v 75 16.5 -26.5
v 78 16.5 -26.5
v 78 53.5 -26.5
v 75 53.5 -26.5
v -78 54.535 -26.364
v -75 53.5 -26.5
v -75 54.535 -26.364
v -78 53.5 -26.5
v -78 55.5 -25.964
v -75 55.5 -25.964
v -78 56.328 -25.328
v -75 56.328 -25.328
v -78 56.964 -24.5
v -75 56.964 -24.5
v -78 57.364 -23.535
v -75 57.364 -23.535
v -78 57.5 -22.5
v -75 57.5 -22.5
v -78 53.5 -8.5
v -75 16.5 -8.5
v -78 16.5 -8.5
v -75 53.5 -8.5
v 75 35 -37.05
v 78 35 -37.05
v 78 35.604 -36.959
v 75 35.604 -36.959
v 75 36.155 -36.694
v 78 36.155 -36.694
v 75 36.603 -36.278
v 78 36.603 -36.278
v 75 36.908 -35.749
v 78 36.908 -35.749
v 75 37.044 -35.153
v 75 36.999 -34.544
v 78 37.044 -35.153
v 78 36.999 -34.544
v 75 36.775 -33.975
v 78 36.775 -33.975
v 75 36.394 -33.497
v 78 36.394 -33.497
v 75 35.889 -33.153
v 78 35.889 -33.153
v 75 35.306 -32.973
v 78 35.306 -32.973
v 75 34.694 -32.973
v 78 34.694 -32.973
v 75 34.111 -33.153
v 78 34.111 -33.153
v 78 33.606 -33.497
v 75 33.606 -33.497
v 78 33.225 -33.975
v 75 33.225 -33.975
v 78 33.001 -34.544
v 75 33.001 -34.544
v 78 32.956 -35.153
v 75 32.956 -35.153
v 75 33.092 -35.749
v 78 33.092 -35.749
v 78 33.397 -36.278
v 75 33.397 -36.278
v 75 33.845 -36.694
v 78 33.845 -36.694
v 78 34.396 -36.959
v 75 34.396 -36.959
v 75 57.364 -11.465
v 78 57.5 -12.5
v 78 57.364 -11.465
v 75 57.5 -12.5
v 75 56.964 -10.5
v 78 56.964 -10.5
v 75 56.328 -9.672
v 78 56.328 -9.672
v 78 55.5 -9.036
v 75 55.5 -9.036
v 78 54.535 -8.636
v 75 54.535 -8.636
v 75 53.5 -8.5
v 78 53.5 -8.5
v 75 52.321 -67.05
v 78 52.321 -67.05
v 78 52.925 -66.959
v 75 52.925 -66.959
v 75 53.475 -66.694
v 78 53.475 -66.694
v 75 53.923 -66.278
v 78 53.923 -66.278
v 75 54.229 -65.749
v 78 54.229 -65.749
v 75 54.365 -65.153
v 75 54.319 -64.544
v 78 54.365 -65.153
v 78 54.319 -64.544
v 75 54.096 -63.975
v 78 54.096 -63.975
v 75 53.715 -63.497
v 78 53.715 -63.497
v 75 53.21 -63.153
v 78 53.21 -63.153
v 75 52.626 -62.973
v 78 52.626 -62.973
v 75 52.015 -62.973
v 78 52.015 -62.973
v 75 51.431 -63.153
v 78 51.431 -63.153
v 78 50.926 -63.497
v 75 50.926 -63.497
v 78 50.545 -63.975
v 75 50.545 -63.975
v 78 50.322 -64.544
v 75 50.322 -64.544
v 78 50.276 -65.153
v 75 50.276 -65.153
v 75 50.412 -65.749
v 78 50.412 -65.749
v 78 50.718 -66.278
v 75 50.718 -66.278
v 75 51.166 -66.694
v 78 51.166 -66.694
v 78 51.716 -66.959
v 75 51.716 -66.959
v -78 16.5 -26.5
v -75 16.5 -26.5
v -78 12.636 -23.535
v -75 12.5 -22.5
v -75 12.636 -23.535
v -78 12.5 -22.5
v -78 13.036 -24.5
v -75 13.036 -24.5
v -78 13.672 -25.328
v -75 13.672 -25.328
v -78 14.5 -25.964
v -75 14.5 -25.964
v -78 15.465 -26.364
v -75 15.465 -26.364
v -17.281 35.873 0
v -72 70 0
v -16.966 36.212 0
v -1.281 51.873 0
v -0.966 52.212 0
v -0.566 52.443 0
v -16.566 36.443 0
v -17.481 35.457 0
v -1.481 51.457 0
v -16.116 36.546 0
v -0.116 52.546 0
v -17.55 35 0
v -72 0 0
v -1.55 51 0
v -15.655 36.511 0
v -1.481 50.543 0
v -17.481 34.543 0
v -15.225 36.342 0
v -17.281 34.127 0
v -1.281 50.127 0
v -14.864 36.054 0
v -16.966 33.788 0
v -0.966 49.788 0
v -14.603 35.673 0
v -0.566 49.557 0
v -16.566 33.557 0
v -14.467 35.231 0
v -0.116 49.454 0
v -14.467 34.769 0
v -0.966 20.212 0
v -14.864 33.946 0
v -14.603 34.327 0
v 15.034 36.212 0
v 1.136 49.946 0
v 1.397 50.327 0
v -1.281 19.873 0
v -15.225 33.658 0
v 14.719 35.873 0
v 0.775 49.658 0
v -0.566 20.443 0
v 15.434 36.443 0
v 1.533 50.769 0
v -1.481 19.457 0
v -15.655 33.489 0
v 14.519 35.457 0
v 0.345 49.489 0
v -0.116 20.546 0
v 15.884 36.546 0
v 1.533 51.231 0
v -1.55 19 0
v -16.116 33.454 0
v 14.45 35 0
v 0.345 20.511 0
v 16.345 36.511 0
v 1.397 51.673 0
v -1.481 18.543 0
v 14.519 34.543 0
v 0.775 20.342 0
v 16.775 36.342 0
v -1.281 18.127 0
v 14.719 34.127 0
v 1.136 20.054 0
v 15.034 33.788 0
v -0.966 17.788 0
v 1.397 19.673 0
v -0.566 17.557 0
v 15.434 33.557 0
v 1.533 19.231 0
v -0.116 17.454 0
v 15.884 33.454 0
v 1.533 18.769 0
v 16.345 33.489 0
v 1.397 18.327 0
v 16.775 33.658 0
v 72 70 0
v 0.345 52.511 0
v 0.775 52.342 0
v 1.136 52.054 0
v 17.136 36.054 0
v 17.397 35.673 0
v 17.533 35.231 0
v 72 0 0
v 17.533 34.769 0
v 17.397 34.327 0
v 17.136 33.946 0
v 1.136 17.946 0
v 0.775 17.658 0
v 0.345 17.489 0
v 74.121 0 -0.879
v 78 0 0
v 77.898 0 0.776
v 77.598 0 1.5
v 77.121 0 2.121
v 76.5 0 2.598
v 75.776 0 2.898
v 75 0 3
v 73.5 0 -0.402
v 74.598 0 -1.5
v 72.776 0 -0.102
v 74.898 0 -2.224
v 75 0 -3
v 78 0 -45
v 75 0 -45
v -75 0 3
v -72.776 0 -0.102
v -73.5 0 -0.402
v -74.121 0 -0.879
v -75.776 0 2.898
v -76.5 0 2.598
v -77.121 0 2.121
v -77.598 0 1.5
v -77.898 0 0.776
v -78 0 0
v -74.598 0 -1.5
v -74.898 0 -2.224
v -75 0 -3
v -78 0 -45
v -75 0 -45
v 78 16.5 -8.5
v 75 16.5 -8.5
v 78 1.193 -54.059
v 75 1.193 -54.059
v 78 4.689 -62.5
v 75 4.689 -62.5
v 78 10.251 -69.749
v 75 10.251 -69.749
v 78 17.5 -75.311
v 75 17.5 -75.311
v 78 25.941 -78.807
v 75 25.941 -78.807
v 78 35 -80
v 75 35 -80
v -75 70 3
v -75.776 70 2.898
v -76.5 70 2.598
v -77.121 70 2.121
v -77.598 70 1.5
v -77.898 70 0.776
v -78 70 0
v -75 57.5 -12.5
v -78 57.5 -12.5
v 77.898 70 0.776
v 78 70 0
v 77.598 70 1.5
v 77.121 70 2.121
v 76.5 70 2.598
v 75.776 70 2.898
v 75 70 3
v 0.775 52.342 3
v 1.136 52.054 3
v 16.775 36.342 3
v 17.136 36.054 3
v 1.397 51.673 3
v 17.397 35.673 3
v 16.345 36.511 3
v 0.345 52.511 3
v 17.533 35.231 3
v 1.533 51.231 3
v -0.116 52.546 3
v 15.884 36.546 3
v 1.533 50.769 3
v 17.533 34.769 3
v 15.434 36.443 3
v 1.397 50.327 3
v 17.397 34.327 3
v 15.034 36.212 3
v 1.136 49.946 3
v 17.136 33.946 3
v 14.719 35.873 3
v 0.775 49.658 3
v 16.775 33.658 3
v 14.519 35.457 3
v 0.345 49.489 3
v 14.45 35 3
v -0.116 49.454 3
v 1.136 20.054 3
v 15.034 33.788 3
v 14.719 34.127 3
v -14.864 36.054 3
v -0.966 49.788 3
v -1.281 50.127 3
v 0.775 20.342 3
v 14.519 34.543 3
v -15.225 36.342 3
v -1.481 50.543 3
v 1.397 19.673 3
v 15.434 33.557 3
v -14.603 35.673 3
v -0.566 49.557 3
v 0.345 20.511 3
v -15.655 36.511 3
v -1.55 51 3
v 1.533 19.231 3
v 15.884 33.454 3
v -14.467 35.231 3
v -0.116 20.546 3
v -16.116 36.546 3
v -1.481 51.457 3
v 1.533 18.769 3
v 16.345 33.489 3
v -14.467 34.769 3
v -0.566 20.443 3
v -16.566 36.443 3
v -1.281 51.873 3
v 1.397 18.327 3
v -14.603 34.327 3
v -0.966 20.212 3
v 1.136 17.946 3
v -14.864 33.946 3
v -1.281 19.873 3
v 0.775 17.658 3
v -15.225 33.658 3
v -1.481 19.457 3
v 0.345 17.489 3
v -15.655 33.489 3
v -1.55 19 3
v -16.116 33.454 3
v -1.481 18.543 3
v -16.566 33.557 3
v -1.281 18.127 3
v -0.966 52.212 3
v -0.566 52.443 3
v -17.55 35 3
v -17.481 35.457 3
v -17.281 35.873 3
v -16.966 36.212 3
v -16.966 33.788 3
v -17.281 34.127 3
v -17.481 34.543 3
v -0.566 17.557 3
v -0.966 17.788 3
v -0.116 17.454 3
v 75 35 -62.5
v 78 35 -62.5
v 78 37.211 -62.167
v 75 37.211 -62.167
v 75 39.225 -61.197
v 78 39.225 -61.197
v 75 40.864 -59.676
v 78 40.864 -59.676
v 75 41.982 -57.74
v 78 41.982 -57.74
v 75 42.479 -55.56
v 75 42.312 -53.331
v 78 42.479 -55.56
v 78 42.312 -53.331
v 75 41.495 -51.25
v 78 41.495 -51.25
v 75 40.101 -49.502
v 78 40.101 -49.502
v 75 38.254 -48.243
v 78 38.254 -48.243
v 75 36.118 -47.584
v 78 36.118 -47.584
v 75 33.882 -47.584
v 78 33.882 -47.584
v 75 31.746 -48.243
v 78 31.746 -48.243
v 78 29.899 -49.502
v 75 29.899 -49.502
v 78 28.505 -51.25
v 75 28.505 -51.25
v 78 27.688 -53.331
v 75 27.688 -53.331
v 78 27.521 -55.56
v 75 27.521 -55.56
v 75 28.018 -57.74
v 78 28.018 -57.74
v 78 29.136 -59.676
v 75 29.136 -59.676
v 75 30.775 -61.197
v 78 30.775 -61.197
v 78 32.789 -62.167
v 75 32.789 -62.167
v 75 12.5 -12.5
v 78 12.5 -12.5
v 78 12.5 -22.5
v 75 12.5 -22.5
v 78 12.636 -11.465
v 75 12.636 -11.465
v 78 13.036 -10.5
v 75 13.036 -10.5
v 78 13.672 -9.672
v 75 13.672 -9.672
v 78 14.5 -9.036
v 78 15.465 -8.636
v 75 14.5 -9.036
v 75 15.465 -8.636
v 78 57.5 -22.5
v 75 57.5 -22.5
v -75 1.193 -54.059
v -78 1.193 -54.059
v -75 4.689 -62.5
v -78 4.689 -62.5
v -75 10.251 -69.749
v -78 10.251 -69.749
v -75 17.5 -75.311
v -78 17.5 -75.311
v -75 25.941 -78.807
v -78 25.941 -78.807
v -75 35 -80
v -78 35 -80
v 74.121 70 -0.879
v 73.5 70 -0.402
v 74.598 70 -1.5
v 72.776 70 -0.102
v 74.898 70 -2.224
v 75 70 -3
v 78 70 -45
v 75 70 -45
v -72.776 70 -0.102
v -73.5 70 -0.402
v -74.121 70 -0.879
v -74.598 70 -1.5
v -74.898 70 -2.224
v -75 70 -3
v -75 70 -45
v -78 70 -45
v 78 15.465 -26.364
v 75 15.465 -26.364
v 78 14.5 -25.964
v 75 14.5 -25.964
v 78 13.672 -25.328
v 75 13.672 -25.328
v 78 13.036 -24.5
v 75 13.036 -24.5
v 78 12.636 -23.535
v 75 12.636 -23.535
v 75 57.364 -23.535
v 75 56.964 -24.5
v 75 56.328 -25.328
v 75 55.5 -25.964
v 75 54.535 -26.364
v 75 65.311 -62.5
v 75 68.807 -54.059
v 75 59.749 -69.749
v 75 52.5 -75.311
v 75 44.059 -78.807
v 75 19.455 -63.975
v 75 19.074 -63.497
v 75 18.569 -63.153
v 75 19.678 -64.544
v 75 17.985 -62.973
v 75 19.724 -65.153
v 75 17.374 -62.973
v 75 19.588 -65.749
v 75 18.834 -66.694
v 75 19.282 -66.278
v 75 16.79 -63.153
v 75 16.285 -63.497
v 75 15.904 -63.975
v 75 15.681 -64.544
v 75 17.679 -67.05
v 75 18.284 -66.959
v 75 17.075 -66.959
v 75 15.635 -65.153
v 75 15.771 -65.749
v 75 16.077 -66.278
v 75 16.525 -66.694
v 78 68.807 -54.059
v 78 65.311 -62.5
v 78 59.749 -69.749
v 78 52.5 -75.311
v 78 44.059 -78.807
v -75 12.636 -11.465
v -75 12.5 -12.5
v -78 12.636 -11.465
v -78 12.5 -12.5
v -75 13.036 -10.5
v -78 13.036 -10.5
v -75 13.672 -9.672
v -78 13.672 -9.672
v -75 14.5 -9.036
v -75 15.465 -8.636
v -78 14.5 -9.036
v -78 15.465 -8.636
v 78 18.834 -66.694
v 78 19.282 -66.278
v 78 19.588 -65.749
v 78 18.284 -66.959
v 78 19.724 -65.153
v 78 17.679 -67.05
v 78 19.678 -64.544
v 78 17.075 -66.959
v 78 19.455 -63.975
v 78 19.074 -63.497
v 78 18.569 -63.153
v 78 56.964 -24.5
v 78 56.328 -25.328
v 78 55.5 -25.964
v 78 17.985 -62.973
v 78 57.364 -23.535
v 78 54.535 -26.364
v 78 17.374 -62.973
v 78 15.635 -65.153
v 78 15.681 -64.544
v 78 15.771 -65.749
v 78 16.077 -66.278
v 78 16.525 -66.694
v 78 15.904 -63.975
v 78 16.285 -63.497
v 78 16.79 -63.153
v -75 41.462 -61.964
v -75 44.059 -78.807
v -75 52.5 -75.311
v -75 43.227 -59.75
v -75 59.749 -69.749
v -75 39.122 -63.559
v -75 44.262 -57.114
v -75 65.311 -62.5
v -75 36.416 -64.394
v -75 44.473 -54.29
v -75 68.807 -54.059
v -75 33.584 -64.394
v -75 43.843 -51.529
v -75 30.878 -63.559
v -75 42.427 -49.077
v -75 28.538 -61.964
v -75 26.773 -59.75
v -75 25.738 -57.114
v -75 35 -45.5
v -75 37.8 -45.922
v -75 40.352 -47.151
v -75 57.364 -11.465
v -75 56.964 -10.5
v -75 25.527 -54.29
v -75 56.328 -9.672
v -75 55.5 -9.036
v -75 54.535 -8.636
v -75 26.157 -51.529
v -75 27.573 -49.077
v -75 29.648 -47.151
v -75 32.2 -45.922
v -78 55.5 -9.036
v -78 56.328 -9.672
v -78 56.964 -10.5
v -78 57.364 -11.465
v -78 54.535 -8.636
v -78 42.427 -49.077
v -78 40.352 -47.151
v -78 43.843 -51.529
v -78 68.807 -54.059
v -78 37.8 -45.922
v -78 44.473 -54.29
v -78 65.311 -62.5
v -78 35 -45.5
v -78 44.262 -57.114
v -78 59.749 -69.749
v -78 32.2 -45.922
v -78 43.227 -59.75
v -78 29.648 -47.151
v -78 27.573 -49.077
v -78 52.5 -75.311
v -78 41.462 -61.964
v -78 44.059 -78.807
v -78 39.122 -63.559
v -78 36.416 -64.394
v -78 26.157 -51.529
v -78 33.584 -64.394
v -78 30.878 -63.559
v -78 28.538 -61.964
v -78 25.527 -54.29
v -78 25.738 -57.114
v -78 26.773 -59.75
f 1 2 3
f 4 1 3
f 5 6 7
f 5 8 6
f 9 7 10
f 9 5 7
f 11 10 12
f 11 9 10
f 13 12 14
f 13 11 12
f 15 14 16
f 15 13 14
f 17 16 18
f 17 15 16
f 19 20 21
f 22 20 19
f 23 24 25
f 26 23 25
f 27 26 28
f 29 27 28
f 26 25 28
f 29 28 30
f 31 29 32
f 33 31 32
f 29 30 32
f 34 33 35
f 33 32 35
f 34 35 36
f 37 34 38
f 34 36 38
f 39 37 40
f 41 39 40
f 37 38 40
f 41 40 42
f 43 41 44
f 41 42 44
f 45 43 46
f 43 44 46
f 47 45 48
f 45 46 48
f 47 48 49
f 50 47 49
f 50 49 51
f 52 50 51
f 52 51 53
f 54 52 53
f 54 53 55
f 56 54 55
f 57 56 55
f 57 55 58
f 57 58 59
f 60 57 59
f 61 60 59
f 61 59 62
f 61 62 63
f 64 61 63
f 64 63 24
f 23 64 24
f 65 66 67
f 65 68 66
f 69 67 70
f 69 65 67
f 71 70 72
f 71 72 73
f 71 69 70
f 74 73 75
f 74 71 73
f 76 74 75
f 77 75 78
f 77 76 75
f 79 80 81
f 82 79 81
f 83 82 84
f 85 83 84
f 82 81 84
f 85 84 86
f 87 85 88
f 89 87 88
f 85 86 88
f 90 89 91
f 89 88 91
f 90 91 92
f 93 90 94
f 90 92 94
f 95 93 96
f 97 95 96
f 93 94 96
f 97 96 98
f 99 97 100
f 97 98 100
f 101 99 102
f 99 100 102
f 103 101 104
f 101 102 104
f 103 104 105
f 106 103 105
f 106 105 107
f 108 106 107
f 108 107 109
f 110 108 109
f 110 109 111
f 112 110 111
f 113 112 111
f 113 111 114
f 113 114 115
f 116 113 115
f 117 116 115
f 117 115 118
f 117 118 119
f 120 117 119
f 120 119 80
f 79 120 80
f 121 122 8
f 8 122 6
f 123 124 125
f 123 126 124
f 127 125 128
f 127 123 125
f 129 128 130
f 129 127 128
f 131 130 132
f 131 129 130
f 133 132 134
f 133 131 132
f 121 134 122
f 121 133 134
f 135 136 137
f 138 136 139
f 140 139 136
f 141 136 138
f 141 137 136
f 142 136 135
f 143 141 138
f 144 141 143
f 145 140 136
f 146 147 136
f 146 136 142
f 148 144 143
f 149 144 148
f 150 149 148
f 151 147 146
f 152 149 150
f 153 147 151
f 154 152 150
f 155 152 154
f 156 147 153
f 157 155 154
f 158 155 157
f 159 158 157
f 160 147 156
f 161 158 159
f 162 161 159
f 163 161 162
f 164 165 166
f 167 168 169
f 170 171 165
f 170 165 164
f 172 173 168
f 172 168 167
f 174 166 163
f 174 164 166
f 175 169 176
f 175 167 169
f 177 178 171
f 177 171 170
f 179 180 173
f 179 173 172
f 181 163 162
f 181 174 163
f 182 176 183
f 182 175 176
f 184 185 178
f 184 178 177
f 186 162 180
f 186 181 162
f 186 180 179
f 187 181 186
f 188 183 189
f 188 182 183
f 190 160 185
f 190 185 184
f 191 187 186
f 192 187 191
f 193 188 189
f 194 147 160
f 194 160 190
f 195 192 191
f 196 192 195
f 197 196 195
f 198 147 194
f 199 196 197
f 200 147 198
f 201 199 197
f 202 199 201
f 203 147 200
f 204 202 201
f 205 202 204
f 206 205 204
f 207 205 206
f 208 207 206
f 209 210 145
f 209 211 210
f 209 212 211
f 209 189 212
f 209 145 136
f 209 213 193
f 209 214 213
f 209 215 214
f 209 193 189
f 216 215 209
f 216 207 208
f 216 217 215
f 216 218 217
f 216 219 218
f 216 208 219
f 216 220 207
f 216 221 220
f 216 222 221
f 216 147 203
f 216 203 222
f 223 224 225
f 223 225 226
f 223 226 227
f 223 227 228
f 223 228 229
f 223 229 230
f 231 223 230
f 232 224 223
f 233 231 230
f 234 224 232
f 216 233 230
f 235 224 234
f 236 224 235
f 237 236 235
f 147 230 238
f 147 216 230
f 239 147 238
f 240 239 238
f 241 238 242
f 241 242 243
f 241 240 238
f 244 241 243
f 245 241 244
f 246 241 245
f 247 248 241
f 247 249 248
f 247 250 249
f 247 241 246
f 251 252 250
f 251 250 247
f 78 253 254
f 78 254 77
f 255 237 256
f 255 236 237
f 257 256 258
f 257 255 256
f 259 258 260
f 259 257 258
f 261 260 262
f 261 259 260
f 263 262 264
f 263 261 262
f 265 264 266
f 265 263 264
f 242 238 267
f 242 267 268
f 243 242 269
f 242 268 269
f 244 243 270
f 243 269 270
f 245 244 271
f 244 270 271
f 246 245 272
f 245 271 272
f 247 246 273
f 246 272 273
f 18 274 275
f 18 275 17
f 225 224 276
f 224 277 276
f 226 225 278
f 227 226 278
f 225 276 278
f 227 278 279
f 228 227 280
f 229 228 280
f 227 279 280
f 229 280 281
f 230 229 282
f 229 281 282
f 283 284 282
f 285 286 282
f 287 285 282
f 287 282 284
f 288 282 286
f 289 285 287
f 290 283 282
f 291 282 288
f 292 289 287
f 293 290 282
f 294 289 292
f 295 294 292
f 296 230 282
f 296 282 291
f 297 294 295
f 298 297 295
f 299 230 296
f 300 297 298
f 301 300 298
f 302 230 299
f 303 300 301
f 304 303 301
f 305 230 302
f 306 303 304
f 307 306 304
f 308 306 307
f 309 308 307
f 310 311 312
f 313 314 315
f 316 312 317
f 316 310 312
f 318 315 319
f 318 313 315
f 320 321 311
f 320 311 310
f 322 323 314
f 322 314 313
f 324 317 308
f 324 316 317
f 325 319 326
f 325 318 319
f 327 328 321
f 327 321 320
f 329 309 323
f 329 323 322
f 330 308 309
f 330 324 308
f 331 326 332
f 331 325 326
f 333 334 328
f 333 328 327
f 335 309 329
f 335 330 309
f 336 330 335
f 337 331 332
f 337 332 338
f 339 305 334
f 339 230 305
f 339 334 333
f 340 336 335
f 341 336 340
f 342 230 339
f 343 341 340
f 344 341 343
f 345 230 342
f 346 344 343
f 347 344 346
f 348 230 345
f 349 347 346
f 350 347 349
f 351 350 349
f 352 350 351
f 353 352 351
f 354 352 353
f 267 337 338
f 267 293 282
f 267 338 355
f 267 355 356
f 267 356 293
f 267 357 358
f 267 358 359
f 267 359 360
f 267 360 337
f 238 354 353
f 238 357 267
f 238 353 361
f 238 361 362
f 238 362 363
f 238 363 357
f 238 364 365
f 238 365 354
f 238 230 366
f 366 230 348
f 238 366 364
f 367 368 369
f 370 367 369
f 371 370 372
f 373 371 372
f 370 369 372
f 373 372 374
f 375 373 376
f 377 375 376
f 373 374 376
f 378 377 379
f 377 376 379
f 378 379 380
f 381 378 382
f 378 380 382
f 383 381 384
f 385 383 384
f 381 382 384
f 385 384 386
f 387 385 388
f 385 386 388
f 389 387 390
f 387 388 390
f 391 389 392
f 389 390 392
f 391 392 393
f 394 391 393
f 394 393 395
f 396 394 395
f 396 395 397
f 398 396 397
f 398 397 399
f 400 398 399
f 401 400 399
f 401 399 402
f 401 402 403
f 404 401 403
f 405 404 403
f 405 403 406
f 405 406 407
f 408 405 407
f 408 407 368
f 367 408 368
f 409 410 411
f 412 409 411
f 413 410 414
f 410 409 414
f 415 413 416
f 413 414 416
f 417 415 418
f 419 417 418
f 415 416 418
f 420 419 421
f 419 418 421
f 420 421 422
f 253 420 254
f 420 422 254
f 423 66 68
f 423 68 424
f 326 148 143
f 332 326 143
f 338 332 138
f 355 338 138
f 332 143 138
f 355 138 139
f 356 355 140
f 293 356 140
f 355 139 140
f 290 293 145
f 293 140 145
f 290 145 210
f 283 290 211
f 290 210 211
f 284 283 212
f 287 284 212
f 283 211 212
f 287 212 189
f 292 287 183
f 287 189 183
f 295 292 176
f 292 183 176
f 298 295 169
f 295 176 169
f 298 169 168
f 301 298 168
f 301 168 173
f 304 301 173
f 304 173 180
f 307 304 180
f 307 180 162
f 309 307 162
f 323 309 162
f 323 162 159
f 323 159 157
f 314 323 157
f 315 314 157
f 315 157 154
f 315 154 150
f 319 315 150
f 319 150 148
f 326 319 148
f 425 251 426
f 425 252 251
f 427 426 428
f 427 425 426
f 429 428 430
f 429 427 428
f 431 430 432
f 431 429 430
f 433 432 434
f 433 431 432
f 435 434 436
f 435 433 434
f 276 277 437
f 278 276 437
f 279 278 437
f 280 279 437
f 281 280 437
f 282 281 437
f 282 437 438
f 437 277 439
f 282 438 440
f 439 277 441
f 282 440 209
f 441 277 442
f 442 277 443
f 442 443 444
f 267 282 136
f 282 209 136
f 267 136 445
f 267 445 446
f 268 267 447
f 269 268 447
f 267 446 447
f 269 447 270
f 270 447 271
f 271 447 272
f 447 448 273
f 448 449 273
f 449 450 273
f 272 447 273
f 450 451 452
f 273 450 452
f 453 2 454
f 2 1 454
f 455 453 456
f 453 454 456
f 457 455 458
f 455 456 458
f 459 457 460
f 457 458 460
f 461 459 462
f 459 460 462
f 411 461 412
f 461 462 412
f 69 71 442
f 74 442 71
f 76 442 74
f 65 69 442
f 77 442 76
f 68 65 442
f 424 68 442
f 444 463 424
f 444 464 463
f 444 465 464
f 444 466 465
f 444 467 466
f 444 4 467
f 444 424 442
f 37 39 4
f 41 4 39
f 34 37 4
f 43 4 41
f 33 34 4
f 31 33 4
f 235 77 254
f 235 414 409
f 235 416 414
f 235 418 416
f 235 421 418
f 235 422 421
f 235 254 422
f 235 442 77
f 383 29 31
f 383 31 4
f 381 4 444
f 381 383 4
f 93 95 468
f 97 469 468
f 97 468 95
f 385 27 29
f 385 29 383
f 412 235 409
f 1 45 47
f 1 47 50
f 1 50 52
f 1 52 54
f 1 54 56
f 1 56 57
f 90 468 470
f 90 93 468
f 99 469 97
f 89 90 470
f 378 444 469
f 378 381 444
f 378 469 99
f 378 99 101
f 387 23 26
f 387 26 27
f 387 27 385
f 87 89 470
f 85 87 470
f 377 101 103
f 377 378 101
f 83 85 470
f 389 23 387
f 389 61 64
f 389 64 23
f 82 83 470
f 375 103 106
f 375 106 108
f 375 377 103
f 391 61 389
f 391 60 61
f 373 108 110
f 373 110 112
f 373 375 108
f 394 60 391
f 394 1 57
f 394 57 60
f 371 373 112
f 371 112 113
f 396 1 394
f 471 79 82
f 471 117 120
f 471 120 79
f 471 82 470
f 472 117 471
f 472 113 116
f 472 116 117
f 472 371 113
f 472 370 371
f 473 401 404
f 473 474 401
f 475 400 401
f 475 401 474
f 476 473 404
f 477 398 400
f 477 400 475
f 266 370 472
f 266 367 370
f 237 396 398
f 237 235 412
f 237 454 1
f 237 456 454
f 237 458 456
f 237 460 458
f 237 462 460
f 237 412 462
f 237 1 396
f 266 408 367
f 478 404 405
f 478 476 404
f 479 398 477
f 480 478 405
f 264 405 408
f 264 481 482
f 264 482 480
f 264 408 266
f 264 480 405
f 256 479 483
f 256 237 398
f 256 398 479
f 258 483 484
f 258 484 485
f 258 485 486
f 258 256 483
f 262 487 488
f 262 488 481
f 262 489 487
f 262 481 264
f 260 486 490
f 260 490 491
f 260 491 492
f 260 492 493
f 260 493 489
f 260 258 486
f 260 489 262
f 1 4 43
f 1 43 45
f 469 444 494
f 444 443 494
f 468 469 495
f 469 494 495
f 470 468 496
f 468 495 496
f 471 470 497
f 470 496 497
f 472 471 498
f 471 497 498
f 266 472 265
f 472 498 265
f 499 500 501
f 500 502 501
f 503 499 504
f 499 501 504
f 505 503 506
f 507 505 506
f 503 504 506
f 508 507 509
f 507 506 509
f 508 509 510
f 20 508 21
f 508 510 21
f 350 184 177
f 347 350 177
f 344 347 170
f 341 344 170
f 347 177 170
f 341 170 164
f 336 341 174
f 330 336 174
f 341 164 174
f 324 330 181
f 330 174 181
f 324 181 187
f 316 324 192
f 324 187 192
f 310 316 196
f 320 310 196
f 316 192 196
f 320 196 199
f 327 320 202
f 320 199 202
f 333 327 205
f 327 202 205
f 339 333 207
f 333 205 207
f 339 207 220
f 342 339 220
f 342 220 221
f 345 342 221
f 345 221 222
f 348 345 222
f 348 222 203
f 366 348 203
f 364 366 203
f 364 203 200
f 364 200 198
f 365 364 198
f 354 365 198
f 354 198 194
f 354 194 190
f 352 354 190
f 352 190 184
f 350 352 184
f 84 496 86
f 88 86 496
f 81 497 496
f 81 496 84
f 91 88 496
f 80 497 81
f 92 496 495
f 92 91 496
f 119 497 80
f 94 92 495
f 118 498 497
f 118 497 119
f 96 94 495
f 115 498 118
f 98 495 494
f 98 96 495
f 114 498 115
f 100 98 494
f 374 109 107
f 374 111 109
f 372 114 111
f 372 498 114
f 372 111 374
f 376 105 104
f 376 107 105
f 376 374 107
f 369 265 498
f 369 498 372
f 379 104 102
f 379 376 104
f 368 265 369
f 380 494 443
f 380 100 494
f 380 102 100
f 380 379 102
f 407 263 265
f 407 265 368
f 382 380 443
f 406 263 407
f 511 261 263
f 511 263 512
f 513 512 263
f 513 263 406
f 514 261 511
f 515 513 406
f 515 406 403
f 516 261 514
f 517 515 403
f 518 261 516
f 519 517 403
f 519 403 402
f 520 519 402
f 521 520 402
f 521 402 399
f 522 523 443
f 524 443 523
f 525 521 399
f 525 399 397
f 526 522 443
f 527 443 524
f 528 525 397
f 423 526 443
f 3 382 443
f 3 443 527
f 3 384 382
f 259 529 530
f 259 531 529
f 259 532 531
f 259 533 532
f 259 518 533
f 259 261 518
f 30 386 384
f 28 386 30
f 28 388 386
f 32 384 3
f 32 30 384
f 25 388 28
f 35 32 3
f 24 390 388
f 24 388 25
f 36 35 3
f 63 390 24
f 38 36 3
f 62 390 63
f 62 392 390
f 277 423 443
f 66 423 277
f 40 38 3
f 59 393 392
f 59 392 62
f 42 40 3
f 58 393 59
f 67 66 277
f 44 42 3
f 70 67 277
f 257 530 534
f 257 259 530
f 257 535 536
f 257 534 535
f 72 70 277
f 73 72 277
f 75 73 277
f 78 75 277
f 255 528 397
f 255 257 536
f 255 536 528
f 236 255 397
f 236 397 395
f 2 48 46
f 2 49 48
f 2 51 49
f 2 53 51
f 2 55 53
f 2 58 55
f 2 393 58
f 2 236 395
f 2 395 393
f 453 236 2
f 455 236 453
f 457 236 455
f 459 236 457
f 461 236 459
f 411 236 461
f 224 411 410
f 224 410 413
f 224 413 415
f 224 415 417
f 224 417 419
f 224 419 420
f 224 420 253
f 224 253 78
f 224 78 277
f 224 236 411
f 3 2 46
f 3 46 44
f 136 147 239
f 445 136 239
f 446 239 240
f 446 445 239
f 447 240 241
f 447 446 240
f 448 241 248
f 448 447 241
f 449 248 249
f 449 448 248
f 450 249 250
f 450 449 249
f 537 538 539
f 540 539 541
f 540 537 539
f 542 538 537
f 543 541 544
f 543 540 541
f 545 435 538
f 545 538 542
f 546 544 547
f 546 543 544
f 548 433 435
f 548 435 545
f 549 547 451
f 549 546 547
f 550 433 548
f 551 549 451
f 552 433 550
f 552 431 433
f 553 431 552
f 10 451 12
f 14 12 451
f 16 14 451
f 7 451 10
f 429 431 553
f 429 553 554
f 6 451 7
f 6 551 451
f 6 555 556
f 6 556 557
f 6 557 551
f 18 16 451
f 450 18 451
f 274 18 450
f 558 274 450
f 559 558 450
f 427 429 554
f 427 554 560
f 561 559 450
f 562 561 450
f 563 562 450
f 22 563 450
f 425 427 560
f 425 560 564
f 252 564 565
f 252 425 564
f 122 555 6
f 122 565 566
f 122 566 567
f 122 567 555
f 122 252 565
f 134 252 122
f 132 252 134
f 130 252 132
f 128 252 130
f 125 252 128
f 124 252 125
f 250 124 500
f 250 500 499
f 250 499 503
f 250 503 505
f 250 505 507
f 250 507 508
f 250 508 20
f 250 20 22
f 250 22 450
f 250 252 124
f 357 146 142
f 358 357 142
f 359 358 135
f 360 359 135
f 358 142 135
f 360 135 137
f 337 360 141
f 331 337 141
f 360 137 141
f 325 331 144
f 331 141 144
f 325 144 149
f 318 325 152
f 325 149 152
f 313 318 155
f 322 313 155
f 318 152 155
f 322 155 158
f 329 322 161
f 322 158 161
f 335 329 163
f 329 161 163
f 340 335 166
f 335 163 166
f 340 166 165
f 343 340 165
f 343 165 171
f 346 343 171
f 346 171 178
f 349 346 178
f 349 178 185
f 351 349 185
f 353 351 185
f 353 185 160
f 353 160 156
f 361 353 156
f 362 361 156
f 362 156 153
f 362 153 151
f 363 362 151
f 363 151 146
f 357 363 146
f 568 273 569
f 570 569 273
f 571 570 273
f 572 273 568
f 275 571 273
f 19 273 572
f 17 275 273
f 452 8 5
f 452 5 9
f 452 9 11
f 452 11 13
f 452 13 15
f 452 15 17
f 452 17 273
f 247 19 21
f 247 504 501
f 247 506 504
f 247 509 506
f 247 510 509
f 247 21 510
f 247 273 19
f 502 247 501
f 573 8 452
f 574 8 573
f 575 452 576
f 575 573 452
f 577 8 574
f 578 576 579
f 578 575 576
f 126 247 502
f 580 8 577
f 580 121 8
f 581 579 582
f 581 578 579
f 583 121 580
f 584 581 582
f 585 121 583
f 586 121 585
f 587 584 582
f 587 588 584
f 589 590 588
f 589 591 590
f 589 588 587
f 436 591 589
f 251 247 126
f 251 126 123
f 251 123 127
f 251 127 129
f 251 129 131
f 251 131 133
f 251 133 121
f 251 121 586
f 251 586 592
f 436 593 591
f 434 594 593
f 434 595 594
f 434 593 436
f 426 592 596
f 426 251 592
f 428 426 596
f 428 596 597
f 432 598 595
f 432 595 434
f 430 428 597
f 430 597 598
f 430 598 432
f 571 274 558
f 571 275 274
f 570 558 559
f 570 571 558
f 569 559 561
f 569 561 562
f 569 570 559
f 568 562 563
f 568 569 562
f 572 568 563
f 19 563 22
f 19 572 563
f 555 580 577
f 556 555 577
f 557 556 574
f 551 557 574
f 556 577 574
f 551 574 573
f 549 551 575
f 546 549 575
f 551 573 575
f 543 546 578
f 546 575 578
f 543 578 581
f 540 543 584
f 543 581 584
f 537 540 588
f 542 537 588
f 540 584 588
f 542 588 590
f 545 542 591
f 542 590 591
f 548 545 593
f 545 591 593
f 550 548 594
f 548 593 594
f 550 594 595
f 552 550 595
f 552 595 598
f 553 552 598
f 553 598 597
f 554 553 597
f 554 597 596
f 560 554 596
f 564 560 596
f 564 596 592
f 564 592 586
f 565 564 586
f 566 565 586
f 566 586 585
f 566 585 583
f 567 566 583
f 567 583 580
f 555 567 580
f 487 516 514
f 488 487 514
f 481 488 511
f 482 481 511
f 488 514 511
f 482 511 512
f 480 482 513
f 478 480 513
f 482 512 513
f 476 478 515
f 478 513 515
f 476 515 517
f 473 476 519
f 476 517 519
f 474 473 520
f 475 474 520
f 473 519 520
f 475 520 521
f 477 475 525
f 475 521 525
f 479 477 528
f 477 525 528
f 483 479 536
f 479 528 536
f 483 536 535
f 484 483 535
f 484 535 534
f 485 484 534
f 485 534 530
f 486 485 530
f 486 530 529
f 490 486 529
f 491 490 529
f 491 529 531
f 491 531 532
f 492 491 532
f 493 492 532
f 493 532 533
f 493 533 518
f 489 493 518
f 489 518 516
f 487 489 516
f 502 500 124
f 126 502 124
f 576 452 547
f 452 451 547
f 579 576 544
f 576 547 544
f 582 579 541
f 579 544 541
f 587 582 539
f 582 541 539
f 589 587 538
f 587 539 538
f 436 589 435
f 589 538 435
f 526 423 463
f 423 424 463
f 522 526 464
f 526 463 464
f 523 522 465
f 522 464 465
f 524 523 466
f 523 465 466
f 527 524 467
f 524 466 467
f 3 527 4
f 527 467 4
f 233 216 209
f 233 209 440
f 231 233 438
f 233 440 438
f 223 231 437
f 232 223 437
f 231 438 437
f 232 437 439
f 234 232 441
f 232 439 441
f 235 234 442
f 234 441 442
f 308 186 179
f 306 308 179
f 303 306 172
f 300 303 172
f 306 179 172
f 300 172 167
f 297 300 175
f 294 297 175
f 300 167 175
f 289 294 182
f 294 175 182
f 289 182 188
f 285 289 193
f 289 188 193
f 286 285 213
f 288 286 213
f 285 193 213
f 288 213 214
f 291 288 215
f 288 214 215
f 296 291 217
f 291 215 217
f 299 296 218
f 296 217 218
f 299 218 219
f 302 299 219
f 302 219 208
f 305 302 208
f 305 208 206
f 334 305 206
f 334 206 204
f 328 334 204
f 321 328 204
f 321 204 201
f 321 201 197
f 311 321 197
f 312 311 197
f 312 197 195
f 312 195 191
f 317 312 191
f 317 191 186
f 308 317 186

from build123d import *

# Parameters (mm, degrees)
EXTRUDE_1_DEPTH       = 70
FILLET_1_R            = 3
SKETCH_4_R            = 1.55
CUT_EXTRUDE_3_1_DEPTH = 70
SKETCH_13_R           = 2.05
SKETCH_13_R_2         = 7.5
CUT_EXTRUDE_8_DEPTH   = 10
FILLET_6_R            = 35
SKETCH_14_R           = 9.5
CUT_EXTRUDE_9_DEPTH   = 10
SKETCH_15_W           = 18
SKETCH_15_H           = 45
CUT_EXTRUDE_11_DEPTH  = 189.774998345
FILLET_7_R            = 4


with BuildPart() as part:
    # 草图1 → 凸台-拉伸1 (new body)
    with BuildSketch(Plane(origin=(0, 0, 0), x_dir=(1, 0, 0), z_dir=(0, 1, 0))):
        Polygon((-75, 0), (75, 0), (75, 80), (78, 80), (78, -3), (-78, -3), (-78, 80), (-75, 80), align=None)
    extrude(amount=EXTRUDE_1_DEPTH)

    # 圆角1
    fillet_1_edges = [part.edges().sort_by_distance(p)[0] for p in [
        (78, 35, 3),
        (-78, 35, 3),
        (-75, 35, 0),
        (75, 35, 0),
    ]]
    fillet(fillet_1_edges, radius=FILLET_1_R)

    # 草图4 → φ3.1通孔 (cut)
    with BuildSketch(Plane(origin=(0, 0, 0), x_dir=(-1, 0, 0), z_dir=(0, 0, -1))):
        with Locations((0, 51)):
            Circle(SKETCH_4_R)
        with Locations((16, 35)):
            Circle(SKETCH_4_R)
        with Locations((0, 19)):
            Circle(SKETCH_4_R)
        with Locations((-16, 35)):
            Circle(SKETCH_4_R)
    extrude(amount=-CUT_EXTRUDE_3_1_DEPTH, mode=Mode.SUBTRACT)

    # 草图13 → 切除-拉伸8 (cut)
    with BuildSketch(Plane(origin=(78, 0, 0), x_dir=(0, 0, -1), z_dir=(1, 0, 0))):
        with Locations((35, 35)):
            Circle(SKETCH_13_R)
        with Locations((65, 52.320508076)):
            Circle(SKETCH_13_R)
        with Locations((65, 17.679491924)):
            Circle(SKETCH_13_R)
        with Locations((55, 35)):
            Circle(SKETCH_13_R_2)
    extrude(amount=-CUT_EXTRUDE_8_DEPTH, mode=Mode.SUBTRACT)

    # 圆角6
    fillet_6_edges = [part.edges().sort_by_distance(p)[0] for p in [
        (-76.5, 70, -80),
        (-76.5, 0, -80),
        (76.5, 70, -80),
        (76.5, 0, -80),
    ]]
    fillet(fillet_6_edges, radius=FILLET_6_R - 0.0001)  # a hair under: the kernel refuses the full size

    # 草图14 → 切除-拉伸9 (cut)
    with BuildSketch(Plane.ZY.offset(78)):
        with Locations((-55, 35)):
            Circle(SKETCH_14_R)
    extrude(amount=-CUT_EXTRUDE_9_DEPTH, mode=Mode.SUBTRACT)

    # 草图15 → 切除-拉伸11 (cut, through all)
    with BuildSketch(Plane(origin=(78, 0, 0), x_dir=(0, 0, -1), z_dir=(1, 0, 0))):
        with Locations((17.5, 35)):
            Rectangle(SKETCH_15_W, SKETCH_15_H)
    extrude(amount=-CUT_EXTRUDE_11_DEPTH, mode=Mode.SUBTRACT)

    # 圆角7
    fillet_7_edges = [part.edges().sort_by_distance(p)[0] for p in [
        (76.5, 57.5, -26.5),
        (-76.5, 57.5, -26.5),
        (76.5, 12.5, -26.5),
        (-76.5, 12.5, -26.5),
        (76.5, 12.5, -8.5),
        (-76.5, 12.5, -8.5),
        (76.5, 57.5, -8.5),
        (-76.5, 57.5, -8.5),
    ]]
    fillet(fillet_7_edges, radius=FILLET_7_R)


solid = part.part
